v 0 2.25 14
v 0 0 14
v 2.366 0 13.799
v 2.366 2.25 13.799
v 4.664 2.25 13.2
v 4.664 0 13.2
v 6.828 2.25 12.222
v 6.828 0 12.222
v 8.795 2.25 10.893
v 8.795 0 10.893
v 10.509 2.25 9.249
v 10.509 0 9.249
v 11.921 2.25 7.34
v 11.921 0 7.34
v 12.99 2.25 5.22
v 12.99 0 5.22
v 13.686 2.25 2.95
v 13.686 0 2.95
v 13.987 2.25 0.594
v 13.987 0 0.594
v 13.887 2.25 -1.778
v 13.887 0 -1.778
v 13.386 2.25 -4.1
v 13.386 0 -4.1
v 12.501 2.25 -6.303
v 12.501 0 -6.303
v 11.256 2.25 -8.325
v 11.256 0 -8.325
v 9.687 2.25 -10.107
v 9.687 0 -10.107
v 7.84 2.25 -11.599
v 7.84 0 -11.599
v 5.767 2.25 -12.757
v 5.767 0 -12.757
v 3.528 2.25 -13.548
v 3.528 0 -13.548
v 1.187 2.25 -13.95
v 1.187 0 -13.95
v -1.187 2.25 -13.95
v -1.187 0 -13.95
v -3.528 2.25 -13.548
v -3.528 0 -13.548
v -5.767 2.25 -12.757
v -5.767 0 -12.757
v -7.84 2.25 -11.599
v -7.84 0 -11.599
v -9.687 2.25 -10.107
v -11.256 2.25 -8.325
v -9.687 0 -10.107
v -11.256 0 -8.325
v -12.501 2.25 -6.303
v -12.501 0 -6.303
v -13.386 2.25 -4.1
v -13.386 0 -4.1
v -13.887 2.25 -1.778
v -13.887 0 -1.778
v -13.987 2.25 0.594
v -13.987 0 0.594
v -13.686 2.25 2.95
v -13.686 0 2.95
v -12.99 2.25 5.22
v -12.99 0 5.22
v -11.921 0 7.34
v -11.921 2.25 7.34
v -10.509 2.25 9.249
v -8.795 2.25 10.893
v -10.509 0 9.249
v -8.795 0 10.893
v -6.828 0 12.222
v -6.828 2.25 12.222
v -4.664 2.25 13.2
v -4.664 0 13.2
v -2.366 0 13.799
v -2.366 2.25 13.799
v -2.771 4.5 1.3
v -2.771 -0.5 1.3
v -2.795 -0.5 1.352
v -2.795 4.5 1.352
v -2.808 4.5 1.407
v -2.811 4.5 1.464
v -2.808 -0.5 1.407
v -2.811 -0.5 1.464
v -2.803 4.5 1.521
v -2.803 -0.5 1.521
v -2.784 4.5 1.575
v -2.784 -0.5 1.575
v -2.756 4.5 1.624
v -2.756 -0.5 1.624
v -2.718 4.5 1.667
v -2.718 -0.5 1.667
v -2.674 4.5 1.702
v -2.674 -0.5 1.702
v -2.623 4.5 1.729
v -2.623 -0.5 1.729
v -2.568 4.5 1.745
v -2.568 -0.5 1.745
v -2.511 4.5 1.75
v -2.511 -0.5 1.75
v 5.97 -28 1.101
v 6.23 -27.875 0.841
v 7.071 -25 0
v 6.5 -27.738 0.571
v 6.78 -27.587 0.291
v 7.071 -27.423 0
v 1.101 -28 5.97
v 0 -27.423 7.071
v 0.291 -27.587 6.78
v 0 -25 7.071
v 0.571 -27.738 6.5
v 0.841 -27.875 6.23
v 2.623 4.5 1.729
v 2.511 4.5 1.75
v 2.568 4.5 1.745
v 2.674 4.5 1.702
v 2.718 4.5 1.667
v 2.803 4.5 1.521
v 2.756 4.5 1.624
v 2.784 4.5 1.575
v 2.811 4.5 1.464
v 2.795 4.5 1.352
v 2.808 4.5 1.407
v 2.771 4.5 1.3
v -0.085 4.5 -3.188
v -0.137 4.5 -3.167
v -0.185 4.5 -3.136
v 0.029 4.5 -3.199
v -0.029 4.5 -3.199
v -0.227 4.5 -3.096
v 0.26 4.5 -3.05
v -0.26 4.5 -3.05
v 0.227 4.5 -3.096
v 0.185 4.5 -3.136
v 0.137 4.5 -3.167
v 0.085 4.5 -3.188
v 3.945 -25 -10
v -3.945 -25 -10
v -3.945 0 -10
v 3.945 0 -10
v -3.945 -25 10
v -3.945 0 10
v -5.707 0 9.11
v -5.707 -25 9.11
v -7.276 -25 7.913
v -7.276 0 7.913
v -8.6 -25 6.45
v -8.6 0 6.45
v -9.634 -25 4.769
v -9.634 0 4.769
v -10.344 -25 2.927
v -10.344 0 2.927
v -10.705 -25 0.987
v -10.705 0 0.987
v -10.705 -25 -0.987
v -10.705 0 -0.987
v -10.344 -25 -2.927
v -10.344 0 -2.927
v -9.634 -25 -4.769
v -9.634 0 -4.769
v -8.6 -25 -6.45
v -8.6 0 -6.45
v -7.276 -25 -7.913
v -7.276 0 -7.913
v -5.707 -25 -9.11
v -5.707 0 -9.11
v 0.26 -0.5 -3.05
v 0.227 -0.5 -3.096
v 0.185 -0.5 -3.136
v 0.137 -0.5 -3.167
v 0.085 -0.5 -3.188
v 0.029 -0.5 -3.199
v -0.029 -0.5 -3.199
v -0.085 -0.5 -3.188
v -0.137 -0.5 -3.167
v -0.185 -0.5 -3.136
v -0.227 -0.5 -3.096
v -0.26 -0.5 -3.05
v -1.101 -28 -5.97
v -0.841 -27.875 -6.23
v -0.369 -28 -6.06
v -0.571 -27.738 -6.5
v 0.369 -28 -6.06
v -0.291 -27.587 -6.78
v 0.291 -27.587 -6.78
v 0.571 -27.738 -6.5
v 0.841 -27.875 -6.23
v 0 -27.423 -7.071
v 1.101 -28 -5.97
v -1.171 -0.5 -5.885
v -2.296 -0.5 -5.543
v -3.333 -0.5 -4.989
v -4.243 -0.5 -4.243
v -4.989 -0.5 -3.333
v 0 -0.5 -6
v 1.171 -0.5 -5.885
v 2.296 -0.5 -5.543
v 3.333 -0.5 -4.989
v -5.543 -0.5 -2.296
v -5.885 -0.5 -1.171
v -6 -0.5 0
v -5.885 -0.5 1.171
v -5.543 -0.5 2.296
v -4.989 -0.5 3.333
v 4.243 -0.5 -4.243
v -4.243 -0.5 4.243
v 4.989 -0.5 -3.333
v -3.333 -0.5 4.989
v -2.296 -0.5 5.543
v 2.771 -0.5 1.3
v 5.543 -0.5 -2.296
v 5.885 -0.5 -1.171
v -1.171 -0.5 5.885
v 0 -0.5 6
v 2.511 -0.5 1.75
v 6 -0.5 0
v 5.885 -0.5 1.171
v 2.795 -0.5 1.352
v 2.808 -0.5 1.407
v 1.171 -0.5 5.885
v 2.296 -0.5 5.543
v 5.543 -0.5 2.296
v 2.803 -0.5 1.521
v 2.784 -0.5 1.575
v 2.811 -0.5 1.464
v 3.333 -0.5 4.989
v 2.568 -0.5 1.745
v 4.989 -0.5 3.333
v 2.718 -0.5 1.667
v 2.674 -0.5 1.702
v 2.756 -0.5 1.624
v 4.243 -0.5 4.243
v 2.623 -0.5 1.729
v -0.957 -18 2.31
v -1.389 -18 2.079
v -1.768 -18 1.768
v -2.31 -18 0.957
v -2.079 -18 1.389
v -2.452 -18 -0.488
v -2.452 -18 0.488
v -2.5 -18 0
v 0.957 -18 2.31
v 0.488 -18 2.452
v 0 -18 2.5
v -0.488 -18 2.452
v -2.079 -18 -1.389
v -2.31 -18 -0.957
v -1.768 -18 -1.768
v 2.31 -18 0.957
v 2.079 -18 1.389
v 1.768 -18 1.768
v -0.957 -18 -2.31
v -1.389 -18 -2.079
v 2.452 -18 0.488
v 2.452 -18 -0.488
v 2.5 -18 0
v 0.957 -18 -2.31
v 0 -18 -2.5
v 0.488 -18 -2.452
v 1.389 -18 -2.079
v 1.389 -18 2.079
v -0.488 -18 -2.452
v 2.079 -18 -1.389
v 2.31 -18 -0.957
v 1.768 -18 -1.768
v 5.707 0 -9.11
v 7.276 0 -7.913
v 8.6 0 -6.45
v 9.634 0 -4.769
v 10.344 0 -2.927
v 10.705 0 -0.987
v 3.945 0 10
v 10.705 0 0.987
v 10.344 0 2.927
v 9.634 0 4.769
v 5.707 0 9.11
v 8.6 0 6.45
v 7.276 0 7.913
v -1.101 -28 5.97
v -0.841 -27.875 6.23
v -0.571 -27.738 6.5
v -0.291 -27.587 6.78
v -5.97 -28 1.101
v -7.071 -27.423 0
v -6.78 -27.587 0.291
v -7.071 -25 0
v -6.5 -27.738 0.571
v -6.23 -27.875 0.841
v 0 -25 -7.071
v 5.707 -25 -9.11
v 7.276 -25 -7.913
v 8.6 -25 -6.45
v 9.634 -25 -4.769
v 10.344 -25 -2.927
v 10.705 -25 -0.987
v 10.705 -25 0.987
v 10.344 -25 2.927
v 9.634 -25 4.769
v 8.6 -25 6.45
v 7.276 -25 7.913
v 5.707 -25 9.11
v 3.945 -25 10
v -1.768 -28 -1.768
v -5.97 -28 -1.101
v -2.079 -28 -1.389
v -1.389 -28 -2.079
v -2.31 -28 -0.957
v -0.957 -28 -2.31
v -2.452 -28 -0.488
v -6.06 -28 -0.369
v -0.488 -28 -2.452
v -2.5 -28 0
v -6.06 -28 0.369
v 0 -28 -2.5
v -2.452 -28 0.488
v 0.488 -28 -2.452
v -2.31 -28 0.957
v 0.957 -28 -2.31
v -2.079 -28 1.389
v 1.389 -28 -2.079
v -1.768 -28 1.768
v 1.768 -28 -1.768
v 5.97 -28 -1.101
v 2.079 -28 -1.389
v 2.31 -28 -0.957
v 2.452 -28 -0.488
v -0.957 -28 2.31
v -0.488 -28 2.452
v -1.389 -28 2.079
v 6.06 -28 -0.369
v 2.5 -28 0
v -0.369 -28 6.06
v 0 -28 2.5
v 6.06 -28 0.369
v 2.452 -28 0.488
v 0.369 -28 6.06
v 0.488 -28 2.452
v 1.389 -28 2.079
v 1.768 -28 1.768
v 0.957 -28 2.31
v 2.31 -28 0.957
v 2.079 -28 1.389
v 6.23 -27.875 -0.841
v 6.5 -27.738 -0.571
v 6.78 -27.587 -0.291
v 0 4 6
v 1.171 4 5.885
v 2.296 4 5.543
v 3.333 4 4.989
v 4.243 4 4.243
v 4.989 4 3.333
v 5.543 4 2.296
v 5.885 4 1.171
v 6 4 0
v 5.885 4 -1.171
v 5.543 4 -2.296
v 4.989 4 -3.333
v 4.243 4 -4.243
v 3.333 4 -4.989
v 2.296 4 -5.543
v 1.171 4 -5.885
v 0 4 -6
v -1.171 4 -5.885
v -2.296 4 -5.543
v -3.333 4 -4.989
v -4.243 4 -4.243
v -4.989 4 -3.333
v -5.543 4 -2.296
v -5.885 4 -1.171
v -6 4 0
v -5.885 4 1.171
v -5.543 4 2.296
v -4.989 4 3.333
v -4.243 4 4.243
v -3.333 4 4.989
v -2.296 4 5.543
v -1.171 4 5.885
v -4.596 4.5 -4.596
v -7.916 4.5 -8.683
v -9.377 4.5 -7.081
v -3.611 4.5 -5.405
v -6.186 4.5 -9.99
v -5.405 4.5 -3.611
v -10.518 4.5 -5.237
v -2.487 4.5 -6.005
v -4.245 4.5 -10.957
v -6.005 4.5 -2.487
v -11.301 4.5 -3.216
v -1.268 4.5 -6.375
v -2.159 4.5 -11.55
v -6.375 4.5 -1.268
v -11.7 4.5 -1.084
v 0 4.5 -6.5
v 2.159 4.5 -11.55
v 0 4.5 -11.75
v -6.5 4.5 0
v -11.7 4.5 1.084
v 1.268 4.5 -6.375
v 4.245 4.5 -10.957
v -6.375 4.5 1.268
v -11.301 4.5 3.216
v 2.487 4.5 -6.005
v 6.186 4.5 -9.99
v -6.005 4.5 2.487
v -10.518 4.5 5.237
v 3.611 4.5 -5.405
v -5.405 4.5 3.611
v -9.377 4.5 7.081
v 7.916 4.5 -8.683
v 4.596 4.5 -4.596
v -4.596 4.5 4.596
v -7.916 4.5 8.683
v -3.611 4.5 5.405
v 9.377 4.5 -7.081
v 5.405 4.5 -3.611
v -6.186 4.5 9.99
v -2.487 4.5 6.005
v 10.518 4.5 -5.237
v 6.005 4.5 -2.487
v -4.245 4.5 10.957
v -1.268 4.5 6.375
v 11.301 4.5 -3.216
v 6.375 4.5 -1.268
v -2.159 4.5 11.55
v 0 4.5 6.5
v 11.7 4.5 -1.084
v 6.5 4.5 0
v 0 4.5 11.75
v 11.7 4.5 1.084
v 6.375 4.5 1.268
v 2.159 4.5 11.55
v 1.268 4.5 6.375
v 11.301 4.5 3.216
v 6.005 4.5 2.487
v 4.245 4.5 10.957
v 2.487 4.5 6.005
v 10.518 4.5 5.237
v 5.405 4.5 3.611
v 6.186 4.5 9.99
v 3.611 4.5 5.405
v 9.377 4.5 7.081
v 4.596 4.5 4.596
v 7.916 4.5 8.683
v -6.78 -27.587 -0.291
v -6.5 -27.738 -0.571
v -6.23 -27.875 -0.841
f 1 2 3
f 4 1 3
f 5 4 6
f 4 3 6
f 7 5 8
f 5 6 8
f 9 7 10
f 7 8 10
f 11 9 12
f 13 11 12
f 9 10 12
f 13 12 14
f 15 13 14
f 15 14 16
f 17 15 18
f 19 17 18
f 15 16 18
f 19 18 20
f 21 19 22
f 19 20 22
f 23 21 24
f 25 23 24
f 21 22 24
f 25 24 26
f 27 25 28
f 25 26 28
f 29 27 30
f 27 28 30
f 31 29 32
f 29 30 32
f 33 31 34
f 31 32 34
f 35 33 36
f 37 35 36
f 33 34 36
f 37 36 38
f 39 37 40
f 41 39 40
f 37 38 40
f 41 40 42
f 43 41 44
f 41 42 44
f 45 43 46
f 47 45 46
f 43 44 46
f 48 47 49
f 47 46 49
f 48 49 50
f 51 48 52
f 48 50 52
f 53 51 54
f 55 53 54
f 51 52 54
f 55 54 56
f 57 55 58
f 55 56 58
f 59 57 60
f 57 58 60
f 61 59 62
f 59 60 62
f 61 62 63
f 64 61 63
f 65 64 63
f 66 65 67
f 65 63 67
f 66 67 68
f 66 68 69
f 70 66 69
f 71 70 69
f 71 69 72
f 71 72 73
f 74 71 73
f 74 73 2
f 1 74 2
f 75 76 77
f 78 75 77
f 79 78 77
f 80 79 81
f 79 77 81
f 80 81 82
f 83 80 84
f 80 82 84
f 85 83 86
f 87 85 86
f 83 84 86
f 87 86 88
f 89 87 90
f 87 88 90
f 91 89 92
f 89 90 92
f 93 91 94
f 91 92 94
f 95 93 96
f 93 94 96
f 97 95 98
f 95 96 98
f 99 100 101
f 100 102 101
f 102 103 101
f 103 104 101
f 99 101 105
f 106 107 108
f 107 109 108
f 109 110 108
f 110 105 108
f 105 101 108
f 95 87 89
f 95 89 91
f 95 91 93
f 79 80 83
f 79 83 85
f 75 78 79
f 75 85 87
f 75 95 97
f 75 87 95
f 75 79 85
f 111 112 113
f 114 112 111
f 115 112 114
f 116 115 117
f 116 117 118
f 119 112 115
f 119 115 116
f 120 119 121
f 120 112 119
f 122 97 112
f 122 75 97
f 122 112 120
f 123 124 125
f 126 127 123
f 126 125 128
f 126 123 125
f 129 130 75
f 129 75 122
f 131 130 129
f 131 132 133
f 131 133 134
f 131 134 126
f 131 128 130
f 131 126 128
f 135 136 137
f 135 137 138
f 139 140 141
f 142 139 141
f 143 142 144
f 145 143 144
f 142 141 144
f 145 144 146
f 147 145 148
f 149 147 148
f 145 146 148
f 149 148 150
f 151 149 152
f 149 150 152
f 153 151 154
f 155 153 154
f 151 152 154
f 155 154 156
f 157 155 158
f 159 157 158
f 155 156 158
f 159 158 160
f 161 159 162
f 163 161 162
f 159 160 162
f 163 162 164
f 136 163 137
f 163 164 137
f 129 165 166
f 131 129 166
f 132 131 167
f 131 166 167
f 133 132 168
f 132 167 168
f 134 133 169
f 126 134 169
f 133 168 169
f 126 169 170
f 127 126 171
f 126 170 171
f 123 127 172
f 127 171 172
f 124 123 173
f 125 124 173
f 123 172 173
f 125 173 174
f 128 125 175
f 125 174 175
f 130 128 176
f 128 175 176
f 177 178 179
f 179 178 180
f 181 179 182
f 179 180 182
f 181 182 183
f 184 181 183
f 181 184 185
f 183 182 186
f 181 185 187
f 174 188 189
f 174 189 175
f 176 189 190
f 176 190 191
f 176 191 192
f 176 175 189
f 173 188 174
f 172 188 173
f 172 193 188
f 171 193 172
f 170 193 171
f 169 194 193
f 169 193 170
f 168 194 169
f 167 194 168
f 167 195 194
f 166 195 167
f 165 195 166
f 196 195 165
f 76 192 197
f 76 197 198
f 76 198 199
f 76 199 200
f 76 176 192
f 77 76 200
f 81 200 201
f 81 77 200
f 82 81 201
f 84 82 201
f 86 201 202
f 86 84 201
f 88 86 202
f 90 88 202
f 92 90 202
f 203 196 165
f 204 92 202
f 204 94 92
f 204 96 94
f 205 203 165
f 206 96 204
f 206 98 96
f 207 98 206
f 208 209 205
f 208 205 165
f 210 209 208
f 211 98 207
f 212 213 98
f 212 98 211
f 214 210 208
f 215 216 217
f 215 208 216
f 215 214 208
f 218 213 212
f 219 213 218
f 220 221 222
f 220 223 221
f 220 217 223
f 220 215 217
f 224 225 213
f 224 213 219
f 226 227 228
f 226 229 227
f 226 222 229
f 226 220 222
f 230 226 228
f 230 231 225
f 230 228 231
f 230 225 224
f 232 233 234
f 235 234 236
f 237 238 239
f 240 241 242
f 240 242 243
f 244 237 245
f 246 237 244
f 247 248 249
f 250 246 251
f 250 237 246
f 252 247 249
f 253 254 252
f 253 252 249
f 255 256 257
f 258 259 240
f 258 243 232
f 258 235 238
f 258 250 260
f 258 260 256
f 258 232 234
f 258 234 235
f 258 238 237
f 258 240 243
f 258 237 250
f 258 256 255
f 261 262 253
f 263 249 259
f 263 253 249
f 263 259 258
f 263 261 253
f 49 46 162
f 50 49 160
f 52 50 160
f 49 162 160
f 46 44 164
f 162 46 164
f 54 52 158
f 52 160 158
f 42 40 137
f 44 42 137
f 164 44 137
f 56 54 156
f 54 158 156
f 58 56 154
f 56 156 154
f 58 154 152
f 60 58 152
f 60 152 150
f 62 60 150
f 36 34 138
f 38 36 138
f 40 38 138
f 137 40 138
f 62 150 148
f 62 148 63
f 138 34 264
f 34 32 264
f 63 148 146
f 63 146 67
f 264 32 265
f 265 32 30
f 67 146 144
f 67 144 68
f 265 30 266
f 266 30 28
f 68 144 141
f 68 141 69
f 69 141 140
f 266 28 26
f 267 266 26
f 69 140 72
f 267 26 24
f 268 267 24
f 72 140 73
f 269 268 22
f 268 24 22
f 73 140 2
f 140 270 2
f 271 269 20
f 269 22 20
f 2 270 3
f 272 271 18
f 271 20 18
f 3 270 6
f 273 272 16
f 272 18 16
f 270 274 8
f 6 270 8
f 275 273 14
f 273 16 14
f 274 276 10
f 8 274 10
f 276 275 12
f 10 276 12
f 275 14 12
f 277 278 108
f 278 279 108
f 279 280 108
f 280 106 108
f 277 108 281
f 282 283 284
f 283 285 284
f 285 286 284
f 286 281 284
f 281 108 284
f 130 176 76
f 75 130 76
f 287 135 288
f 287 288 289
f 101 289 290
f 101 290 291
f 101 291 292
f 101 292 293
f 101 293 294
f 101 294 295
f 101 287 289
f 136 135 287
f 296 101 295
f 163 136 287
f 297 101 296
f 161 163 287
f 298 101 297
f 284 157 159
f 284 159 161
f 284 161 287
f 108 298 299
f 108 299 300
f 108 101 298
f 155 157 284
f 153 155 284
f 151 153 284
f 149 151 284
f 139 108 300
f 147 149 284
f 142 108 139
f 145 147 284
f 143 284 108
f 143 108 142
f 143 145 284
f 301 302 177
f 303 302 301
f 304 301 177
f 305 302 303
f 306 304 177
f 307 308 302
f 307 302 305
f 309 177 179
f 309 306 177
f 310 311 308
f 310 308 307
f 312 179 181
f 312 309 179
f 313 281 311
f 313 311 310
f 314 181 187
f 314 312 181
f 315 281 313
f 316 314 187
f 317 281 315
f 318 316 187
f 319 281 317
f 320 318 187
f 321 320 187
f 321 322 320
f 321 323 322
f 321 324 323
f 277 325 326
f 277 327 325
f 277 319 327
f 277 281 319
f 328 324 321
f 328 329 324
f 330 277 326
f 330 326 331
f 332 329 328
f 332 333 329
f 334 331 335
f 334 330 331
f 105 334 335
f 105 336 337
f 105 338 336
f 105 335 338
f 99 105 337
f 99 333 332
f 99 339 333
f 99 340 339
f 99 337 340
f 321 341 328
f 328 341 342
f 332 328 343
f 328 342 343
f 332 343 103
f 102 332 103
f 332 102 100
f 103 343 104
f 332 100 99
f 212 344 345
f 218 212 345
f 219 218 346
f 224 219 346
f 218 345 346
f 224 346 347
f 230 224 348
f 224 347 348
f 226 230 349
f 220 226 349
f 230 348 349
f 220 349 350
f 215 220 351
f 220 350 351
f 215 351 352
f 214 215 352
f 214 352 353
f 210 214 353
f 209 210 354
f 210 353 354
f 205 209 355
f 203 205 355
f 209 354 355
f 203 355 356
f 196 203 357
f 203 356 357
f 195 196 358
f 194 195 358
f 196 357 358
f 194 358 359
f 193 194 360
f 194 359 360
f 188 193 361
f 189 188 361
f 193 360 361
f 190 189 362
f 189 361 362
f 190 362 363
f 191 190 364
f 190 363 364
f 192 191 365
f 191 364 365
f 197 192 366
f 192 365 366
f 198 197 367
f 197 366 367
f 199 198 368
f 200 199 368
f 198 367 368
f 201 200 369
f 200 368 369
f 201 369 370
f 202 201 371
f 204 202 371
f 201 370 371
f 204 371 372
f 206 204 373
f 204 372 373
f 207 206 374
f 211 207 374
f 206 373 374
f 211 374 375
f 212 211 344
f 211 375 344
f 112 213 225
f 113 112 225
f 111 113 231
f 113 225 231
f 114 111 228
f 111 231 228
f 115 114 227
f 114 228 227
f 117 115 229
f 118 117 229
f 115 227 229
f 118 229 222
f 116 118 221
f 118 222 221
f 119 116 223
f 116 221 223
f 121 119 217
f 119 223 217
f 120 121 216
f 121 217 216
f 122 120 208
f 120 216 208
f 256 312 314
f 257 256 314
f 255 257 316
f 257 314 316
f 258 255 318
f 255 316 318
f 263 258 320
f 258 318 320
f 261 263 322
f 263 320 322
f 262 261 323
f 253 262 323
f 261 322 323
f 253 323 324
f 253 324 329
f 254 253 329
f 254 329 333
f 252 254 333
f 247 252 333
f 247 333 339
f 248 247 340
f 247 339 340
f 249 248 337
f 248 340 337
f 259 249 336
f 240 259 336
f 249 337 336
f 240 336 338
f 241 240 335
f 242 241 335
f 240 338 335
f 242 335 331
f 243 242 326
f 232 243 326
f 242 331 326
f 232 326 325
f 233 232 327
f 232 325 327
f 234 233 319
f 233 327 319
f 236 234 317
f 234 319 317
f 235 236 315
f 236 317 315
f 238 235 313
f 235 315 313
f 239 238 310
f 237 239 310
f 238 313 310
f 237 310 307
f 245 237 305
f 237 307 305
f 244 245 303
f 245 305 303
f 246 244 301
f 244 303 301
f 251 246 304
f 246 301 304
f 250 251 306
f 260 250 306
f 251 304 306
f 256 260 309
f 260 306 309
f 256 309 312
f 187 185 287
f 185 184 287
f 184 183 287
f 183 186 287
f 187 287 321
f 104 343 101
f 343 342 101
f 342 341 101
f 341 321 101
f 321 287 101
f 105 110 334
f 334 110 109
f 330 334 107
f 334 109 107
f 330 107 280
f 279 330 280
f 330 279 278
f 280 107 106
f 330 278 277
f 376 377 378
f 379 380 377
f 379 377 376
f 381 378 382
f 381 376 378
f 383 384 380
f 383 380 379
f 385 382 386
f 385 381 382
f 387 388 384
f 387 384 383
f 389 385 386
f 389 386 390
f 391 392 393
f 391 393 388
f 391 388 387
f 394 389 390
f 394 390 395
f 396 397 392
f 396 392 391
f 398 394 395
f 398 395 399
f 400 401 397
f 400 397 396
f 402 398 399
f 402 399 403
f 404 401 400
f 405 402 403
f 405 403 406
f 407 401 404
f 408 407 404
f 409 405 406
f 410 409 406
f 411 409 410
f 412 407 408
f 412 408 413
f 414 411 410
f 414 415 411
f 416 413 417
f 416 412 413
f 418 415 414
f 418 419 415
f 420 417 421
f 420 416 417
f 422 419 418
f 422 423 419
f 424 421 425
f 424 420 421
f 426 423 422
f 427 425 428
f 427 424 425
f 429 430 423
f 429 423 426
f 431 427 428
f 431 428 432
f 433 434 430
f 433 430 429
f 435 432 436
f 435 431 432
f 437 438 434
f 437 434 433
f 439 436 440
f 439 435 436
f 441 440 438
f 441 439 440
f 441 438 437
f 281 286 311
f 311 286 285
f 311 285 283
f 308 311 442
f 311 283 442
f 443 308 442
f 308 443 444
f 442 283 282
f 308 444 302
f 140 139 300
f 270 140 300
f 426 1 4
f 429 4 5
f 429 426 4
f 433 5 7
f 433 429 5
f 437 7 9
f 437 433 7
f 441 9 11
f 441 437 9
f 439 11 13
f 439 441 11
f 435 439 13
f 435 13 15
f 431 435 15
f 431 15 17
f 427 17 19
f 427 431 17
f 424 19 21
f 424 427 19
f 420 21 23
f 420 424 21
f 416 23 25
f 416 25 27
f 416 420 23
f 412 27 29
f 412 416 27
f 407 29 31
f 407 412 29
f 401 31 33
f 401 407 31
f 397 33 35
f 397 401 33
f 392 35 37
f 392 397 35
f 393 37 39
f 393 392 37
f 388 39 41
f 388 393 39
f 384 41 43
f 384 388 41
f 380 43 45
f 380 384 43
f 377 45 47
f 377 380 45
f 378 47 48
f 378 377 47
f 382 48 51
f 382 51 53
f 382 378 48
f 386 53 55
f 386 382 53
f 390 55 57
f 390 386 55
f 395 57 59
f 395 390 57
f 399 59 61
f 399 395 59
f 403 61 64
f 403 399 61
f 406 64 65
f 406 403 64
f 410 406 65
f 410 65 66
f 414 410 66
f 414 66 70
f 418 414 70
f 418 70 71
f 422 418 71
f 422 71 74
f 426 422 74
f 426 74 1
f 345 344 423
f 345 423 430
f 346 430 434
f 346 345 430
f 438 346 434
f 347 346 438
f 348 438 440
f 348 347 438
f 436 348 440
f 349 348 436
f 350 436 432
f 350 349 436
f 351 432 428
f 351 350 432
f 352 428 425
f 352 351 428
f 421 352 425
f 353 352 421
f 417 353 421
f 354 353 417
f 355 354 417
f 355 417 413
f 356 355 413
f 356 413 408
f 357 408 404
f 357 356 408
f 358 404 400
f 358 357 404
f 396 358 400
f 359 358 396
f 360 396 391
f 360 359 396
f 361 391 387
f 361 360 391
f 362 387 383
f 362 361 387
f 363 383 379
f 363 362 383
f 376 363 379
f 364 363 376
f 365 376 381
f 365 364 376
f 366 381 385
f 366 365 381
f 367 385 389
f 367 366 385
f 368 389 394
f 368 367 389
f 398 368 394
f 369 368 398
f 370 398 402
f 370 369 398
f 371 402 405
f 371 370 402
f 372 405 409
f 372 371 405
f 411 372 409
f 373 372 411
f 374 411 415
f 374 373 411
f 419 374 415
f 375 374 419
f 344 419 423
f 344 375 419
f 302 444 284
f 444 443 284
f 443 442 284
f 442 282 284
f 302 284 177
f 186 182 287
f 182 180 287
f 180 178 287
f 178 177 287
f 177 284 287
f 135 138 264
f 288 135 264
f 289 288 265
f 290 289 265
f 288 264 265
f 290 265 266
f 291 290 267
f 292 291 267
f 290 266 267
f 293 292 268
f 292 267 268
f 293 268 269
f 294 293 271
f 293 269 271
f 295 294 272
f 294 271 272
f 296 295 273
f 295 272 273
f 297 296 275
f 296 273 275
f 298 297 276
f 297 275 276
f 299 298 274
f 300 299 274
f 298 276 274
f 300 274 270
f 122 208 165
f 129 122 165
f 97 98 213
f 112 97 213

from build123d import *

# Parameters (mm, degrees)
SKETCH_1_R          = 14
EXTRUDE_1_DEPTH     = 4.5
CHAMFER_1_SIZE      = 2.25
SKETCH_2_R          = 10.75
EXTRUDE_2_DEPTH     = 25
CUT_EXTRUDE_START   = -25
CUT_EXTRUDE_1_DEPTH = 25
SKETCH_4_R          = 6
CUT_EXTRUDE_2_DEPTH = 5
EXTRUDE_3_DEPTH     = 5
CHAMFER_2_SIZE      = 0.5
EXTRUDE_4_DEPTH     = 3
SKETCH_7_R          = 2.5
CUT_EXTRUDE_3_DEPTH = 10


with BuildPart() as part:
    # 草图1 → 凸台-拉伸1 (new body)
    with BuildSketch(Plane(origin=(0, 0, 0), x_dir=(1, 0, 0), z_dir=(0, 1, 0))):
        with Locations(Location((0, 0, 0), (0, 0, 270))):
            Circle(SKETCH_1_R)
    extrude(amount=EXTRUDE_1_DEPTH)

    # 倒角1
    chamfer_1_edges = [part.edges().sort_by_distance(p)[0] for p in [
        (0, 4.5, -14),
    ]]
    chamfer(chamfer_1_edges, length=CHAMFER_1_SIZE)

    # 草图2 → 凸台-拉伸2 (add)
    with BuildSketch(Plane.XZ):
        with Locations(Location((0, 0, 0), (0, 0, 90))):
            Circle(SKETCH_2_R)
    extrude(amount=EXTRUDE_2_DEPTH)

    # 草图3 → 切除-拉伸1 (cut)
    with BuildSketch(Plane.XZ.offset(25).offset(CUT_EXTRUDE_START)):
        with BuildLine():
            Line((-3.94493346, -10), (3.94493346, -10))
            ThreePointArc((3.94493346, -10), (0, -10.75), (-3.94493346, -10))
        make_face()
        with BuildLine():
            Line((-3.94493346, 10), (3.94493346, 10))
            ThreePointArc((3.94493346, 10), (0, 10.75), (-3.94493346, 10))
        make_face()
    extrude(amount=CUT_EXTRUDE_1_DEPTH, mode=Mode.SUBTRACT)

    # 草图4 → 切除-拉伸2 (cut)
    with BuildSketch(Plane(origin=(0, 4.5, 0), x_dir=(1, 0, 0), z_dir=(0, 1, 0))):
        with Locations(Location((0, 0, 0), (0, 0, 270))):
            Circle(SKETCH_4_R)
    extrude(amount=-CUT_EXTRUDE_2_DEPTH, mode=Mode.SUBTRACT)

    # 草图5 → 凸台-拉伸3 (add)
    with BuildSketch(Plane(origin=(0, -0.5, 0), x_dir=(1, 0, 0), z_dir=(0, 1, 0))):
        with BuildLine():
            Line((-0.259807621, 3.05), (-2.771281292, -1.3))
            ThreePointArc((-2.771281292, -1.3), (-2.771281292, -1.6), (-2.511473671, -1.75))
            Line((-2.511473671, -1.75), (2.511473671, -1.75))
            ThreePointArc((2.511473671, -1.75), (2.771281292, -1.6), (2.771281292, -1.3))
            Line((2.771281292, -1.3), (0.259807621, 3.05))
            ThreePointArc((0.259807621, 3.05), (0, 3.2), (-0.259807621, 3.05))
        make_face()
    extrude(amount=EXTRUDE_3_DEPTH)

    # 倒角2
    chamfer_2_edges = [part.edges().sort_by_distance(p)[0] for p in [
        (0, 4.5, -6),
    ]]
    chamfer(chamfer_2_edges, length=CHAMFER_2_SIZE)

    # 草图6 → 凸台-拉伸4 (add)
    with BuildSketch(Plane.XZ.offset(25)):
        Polygon((7.071067812, 0), (0, 7.071067812), (-7.071067812, 0), (0, -7.071067812), align=None)
    extrude(amount=EXTRUDE_4_DEPTH)

    # 草图7 → 切除-拉伸3 (cut)
    with BuildSketch(Plane.XZ.offset(28)):
        with Locations(Location((0, 0, 0), (0, 0, 270))):
            Circle(SKETCH_7_R)
    extrude(amount=-CUT_EXTRUDE_3_DEPTH, mode=Mode.SUBTRACT)

    # 草图9 → 切除-旋转3 (revolve, cut)
    with BuildSketch(Plane.XY):
        Polygon((-7.071067812, -27.422649731), (-7.071067812, -28), (-6.071067812, -28), align=None)
    revolve(axis=Axis((0, 0, 0), (0, -1, 0)), mode=Mode.SUBTRACT)


solid = part.part
